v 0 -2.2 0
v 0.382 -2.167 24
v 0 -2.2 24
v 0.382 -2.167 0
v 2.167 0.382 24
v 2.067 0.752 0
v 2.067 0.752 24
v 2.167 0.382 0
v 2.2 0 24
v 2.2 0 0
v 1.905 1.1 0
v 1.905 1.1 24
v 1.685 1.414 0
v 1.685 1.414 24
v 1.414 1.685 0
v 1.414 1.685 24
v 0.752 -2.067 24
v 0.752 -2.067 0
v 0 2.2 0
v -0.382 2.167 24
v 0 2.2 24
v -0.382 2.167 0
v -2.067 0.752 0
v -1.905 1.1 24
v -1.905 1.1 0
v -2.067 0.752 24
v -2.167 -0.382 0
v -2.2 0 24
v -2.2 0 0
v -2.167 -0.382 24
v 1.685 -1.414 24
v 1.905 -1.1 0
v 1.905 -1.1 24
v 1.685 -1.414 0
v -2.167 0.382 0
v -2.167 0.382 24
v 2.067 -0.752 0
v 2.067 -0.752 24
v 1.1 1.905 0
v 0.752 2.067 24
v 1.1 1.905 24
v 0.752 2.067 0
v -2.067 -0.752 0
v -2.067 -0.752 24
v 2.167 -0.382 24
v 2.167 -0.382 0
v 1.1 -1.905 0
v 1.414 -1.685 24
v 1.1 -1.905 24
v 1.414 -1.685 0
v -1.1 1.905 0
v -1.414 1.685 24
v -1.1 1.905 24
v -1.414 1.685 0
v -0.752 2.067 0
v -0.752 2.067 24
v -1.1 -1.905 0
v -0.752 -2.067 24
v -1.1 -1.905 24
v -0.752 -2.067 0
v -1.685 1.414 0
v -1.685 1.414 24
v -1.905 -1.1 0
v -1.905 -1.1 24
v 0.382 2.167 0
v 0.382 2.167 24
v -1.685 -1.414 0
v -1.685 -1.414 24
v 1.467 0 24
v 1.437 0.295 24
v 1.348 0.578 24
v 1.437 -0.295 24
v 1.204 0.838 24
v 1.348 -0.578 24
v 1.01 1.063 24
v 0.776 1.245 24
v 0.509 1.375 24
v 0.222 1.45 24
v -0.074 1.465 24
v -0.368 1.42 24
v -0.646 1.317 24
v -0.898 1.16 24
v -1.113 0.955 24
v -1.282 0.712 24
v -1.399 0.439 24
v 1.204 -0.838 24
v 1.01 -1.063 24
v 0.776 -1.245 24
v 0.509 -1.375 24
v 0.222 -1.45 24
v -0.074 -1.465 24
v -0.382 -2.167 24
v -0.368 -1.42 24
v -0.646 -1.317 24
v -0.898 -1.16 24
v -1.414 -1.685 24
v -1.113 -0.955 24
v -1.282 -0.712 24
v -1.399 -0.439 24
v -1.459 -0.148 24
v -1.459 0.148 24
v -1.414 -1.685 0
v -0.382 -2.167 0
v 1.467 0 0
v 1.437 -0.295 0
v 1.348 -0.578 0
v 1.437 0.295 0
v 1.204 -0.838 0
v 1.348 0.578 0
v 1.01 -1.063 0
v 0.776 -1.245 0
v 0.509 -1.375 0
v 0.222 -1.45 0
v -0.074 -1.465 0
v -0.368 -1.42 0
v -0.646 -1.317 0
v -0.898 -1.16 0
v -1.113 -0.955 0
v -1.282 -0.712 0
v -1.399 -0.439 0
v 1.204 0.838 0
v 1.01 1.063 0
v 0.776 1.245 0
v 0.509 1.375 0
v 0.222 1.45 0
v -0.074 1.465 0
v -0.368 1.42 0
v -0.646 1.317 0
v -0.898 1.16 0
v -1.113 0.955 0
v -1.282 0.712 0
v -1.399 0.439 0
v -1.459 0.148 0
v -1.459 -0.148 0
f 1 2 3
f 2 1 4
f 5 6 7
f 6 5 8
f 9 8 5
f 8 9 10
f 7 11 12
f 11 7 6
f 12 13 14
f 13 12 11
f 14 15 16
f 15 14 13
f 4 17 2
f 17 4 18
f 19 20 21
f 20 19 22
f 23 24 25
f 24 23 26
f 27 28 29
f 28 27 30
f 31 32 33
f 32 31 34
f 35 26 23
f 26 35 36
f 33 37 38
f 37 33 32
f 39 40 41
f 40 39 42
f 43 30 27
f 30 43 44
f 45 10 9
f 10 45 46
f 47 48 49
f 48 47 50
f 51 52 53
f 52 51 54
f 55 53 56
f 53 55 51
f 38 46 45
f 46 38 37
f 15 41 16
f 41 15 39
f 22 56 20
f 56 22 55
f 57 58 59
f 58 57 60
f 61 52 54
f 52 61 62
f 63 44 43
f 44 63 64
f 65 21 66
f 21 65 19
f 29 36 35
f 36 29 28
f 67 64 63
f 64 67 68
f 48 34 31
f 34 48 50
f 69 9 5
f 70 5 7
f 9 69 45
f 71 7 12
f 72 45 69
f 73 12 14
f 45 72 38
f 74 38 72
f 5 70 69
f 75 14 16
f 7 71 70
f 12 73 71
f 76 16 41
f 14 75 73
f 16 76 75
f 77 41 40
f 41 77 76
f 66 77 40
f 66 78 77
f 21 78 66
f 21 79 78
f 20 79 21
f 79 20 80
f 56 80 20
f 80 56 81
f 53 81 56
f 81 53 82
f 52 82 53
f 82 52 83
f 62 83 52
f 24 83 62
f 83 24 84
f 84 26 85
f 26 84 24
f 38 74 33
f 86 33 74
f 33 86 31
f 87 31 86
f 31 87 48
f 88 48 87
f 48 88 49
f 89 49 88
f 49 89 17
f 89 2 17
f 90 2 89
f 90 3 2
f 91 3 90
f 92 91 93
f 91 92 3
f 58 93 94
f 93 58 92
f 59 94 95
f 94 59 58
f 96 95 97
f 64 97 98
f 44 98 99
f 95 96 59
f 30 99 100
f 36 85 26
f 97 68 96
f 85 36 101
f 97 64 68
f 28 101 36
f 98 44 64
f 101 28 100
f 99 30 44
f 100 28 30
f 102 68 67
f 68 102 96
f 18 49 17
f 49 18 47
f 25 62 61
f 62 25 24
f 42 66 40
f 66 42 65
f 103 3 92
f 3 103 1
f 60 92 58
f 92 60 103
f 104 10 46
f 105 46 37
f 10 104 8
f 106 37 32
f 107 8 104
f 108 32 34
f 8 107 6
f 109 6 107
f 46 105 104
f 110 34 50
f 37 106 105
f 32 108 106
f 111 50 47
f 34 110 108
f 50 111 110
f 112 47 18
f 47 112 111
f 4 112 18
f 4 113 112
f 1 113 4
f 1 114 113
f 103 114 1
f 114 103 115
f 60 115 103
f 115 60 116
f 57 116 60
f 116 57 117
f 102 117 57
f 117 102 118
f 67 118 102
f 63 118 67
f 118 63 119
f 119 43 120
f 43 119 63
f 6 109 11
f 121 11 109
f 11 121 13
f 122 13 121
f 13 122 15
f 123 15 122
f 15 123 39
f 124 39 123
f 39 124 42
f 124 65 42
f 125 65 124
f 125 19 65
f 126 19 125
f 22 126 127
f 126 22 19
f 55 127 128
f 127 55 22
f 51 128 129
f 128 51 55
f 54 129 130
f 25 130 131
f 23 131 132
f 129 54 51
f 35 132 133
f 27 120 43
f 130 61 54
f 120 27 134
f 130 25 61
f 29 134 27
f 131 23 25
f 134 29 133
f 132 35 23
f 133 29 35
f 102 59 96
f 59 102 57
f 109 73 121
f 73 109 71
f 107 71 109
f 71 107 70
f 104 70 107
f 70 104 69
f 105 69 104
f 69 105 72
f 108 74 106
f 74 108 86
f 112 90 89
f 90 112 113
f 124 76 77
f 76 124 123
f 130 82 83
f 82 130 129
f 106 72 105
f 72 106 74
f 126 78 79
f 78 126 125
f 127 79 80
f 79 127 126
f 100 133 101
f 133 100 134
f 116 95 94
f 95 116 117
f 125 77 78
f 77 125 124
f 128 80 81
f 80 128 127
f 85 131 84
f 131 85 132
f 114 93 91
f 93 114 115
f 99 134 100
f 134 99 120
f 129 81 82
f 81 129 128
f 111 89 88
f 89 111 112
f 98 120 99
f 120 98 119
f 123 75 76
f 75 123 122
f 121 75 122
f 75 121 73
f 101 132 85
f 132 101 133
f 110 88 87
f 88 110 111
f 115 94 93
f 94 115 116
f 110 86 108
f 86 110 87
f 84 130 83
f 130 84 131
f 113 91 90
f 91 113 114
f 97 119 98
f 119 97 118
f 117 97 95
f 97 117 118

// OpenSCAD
// file: print-parameters.scad
/*
Parametric LEGO Print Tuning Parameters

Published at
    http://www.thingiverse.com/thing:2303714
Maintained at
    https://github.com/paulirotta/parametric_lego
See also the related files
    LEGO Sign Generator - https://www.thingiverse.com/thing:2546028
    LEGO Enclosure Generator - https://www.thingiverse.com/thing:2544197


By Paul Houghton
Twitter: @mobile_rat
Email: paulirotta@gmail.com
Blog: https://medium.com/@paulhoughton

Creative Commons Attribution ShareAlike NonCommercial License
    https://creativecommons.org/licenses/by-sa/4.0/legalcode

Design work kindly sponsored by
    http://futurice.com

Imported automatically into other design files when you include lego_parameters:
    include <lego_parameters.scad>
 

INSTRUCTIONS
============
1. Test print lego_calibration.scad

2. Choose a fit with real LEGO

3. Enter those  numbers here. Most commonly you only adjust the top_tweak, bottom_tweak
   and side_connector_tweak numbers to match for your current use case and
   material/printer/slicer settings. Add comment to this file to help remember what you
   have calibrated now and in the past.

4. Print a couple of 4x4 blocks with these adjusted parameters

5. Confirm your calibration fit with real LEGO and between two printed blocks.

6. All other models in this set will automatically now be adjusted to use your calibration numbers.


SUGGESTIONS
===========
- Don't waste time- use high precision, injection-moulded LEGO parts when they are suitable and available.

- Layer height is not paricularly important, you can use your "standard" setting.

- If needed for a good snap fit, slow down or make similar adjustments to show fine details
  and strong inter-layer adhesion (especially with flexible materials).

- Some printing materials are slippery, not very flexible, or subject to small chips breaking off. This
  can affect the fit and part lifeime. In such cases, look at other parameters such as knob_height and
  geometric flexture adjustments to avoid making your calibration is more tight than needed for your
  application.

- Smaller nozzles give better results. The models are adjusted to work on FFF nozzles up to about 0.6mm
  diameter.
  
- Be patient. You can achieve a great fit and make many things with blocks. 
*/


/* [3D Printing Top Connector Adjustments] */

// Top knob size adjustment (larger is a stiffer fit, add in multiples of 0.01mm as determined from your calibration-block print)
top_tweak = 0;

// Size of the top connectors (note that some plastics are more slippery or brittle than ABS and this may negatively affect results or part lifetime, the value below is tuned for Taz 6 with 0.5 nozzle, Lulzbot Cura default and NGEN)
knob_radius=2.45 + 0.12 + top_tweak;

// Height of the connectors (1.8 is Lego standard, 2 may give a stronger hold while still maintaining compatibility)
knob_height=1.8;

// Size of the small flexture cavity inside each knob (default is 1.4, set to 0 for flexible materials)
knob_flexture_radius=1.4;

// Height of the easy connect slope near connector top (0 to disable such as for flexible materials, a bigger value such as 0.1 may help ease a tightly tuned fit or compensate for overextrusion)
knob_bevel=0.1;


/* [3D Printing Bottom Connector Adjustments] */

// Bottom connector size adjustment (larger is a stiffer fit, add in multiples of 0.01mm as determined from your calibration-block print)
bottom_tweak = 0;

// Bottom connector flexture ring size (note that some plastics are more slippery or brittle than ABS and this may negatively affect results or part lifetime, the value below is tuned for Taz 6 with 0.5 nozzle, Lulzbot Cura default and NGEN)
ring_radius=3.25 - 0.1 + bottom_tweak;

// Base distance which small stiffeners protrude inwards from outside shell edges of a block to hold the knobs of any block below
outside_lock_thickness=1.44 + bottom_tweak;

// Additional distance from outside lock and connector rings which small flexture-fit rims protrude inwards to grab the base of knobs for asymmetric side pressure to assist a snap fit
side_lock_thickness=0.02;


/* [3D Printing Side Connector Adjustments] */

// Side connector size adjustment (larger is a looser fit, add in multiples of 0.01mm as determined from your calibration-block print)
axle_hole_tweak = 0;

// Technic connector hole
axle_hole_radius = 2.45 + 0.02 + axle_hole_tweak;
// file: lego_parameters.scad
/*
Parametric LEGO Block Parameters

Published at
    http://www.thingiverse.com/thing:2303714
Maintained at
    https://github.com/paulirotta/parametric_lego
See also the related files
    LEGO Sign Generator - https://www.thingiverse.com/thing:2546028
    LEGO Enclosure Generator - https://www.thingiverse.com/thing:2544197


By Paul Houghton
Twitter: @mobile_rat
Email: paulirotta@gmail.com
Blog: https://medium.com/@paulhoughton

Creative Commons Attribution ShareAlike NonCommercial License
    https://creativecommons.org/licenses/by-sa/4.0/legalcode

Design work kindly sponsored by
    http://futurice.com

Import this into other design files to set baseline constants:
    include <lego_parameters.scad>
*/

/* [LEGO Basic Options] */

// What type of object to generate: 1=>block, 2=>block without top knobs, 3=>block without bottom connector, 4=>block without top knob or bottom connector
mode=1; // [1:1, 2:2, 3:3, 4:4]

// Length of the block (LEGO knob count)
l = 4; 

// Width of the block (LEGO knob count)
w = 3;

// Height of the block (LEGO brick layer count)
h = 1;

// Place holes in the corners of the panel for mountings screws (0=>no holes, 1=>holes)
bolt_holes=1; // [0:0, 1:1]

// Size of corner holes for mountings screws
bolt_hole_radius=1.5;

/* [3D Printing Adjustments] */

// Top connector size tweak => + = more tight fit, 0.06 for PLA, 0 for ABS, 0.07 for NGEN
top_tweak = 0;

// Bottom connector size tweak => + = more tight fit, -0.03 for PLA, 0 for ABS, -0.01 NGEN
bottom_tweak = 0;

// Height of the easy connect slope near connector top (0 to disable is standard a slightly faster to generate the model, a bigger value such as 0.4 may help if you adjust a tight fit but most printers' slicers will simplify away most usable bevels)
knob_bevel=0;

// Number of flexure cuts across the inside of each knob
knob_slice_count=0;

// Width of flexure cuts across the top of the knob
knob_slice_width=0.15;

// Length of the slice the knob from inside towards the edge
knob_slice_length_ratio=0.7;

/* [LEGO Technics] */

// Add full width through holes spaced along the length for LEGO Techics connectors (0=>no holes, 1=>simple air vents, 2=>single ended Technic connector, 3=>dual ended Technic connector)
side_holes = 1;  // [0:0, 1:1, 2:2, 3:3]

// Add a sheath around side holes (turn off for extra ventilation or rotating shafts)
side_hole_sheaths = 0; // [0:0, 1:1]

// Add short end holes spaced along the width for LEGO Techics connectors (0=>no holes, 1=>simple air vents, 2=>technics connector)
end_holes = 2;  // [0:0, 1:1, 2:2]

// Add a sheath around end holes (turn off for extra ventilation or rotating shafts)
end_hole_sheaths = 1; // [0:0, 1:1]

// Technic connector hole size tweak => + = more loose fit
bearing_hole_tweak = 0;


/* [Heat Ventilation] */

// Add holes in the top deck to improve airflow and reduce weight (0=>no holes, 1=>holes)
top_vents = 1;

// Size of a hole in the top of each knob to keep the cutout as part of the outside surface (slicer-friendly if knob_slice_count=0). Use a larger number for air circulation or to drain resin from the cutout, or 0 to disable.
knob_flexture_airhole_radius=0;

/* [Advanced] */

// Minimum angle to approximate a circle
$fa=6;

// Minimum segment length to approximate a circle
$fs=0.5;

// Clearance space on the outer surface of bricks
skin = 0.1; 

// Width of a line etched in the side of multi-layer block sets (0 to disable)
ridge_width = 0.15;

// Depth of a line etched in the side of multi-layer block sets
ridge_depth = 0.3;

// Distance below knob top surface and the internal cutout
knob_top_thickness=1;

// Size of the connectors
knob_radius=2.4;

// Height of the connectors (1.8 is Lego standard, longer valie like 2.4 gives a stronger hold while still maintaining compatibility)
knob_height=2.4;

// Size of the small flexture cavity inside each connector
knob_flexture_radius=1.5;

// Height of the hole beneath each knob
knob_flexture_height=4.55;

// Number of side to simulate a circle in the air hole and (smaller numbers render faster and are usually sufficient)
airhole_fn=16;

// Width of horizontal surface strengthening slats (usually between the bottom rings)
bottom_stiffener_width=3.8;

// Height of horizontal surface strengthening slats (appears between the bottom rings)
bottom_stiffener_height=4.5;

// Width of horizontal surface strengthening slats (usually between the bottom rings)
side_stiffener_width=0.8;

// Distance from inside walls which small stiffeners protrude inwards
side_stiffener_thickness=0.2;

// Basic unit horizonal size of LEGO
block_width=8;

// Basic unit vertial size of LEGO
block_height=9.6;

// Thickness of the solid outside surface of LEGO
block_shell=1.6; // thickness

// Depth which connectors may press into part bottom
socket_height= 8.6;

// Depth which the inside of connectors are hollowed out
socket_flexture_height= 7.4;

// Bottom connector assistance ring size
ring_radius=3.25;

/* [Advanced LEGO Technic Options] */

// Technic connector hole
bearing_hole_radius = 2.45;

// Technic connector inset radius
bearing_inset_radius = 3.1;

// Technic connector inset depth
bearing_inset_depth = 0.8;

// Technic connector additional depth when cut into a solid surface
bearing_inset_depth_clearance = 1;

// An axle which fits loosely in a technic bearing hole
technic_axle_radius = 2.4;

// How deep into a brick should a hole go before flaring out to grip
technic_bearing_length = 6.2;

// Size of an cylinder wrapped around the entrance to bearing holes
technic_sheath_thickness = 0.6;
// file: lego-parameters.scad
/*
Parametric LEGO Block Parameters

Published at
    http://www.thingiverse.com/thing:2303714
Maintained at
    https://github.com/paulirotta/parametric_lego
See also the related files
    LEGO Sign Generator - https://www.thingiverse.com/thing:2546028
    LEGO Enclosure Generator - https://www.thingiverse.com/thing:2544197


By Paul Houghton
Twitter: @mobile_rat
Email: paulirotta@gmail.com
Blog: https://medium.com/@paulhoughton

Creative Commons Attribution ShareAlike NonCommercial License
    https://creativecommons.org/licenses/by-sa/4.0/legalcode

Design work kindly sponsored by
    http://futurice.com

Import this into other design files to set baseline constants:
    include <lego_parameters.scad>
*/

/* [LEGO-compatible Options] */

// Length of the block (LEGO unit count)
l = 4; 

// Width of the block (LEGO unit count)
w = 4;

// Height of the block (LEGO unit count)
h = 1;


/* [Basic Block Features] */

// Presence of bottom connector sockets
sockets= 1; // [0:no sockets, 1:sockets]

// Presence of top connector knobs
knobs=1; // [0:disabled, 1:enabled]

// Place holes in the corners for mountings screws (0=>no holes, 1=>holes)
bolt_holes=0; // [0:no holes, 1:holes]

// Size of corner holes for M3 mountings bolts
bolt_hole_radius=1.5;

// Interior fill for layers above the bottom
solid_upper_layers = 0; // [0:empty, 1:solid]

// Interior fill for layers above the bottom
solid_bottom_layer = 0; // [0:empty, 1:solid]


/* [Technic-compatible Block Features] */

// Add full width through holes spaced along the length for LEGO Techics connectors
side_holes = 0;  // [0:disabled, 1:short air vents, 2:short connectors, 3:full width connectors]

// Add a sheath around Technic side holes (disable for extra ventilation, enable for connector lock notches)
side_sheaths = 1; // [0:disabled, 1:enabled]

// Add short end holes spaced along the width for LEGO Techics connectors
end_holes = 2;  // [0:disabled, 1:short air vents, 2:short connectors, 3:full length connectors]

// Add a sheath around end holes  (disable for extra ventilation, enable for connector lock notches)
end_sheaths = 1; // [0:disabled, 1:enabled]

// Add holes in the top deck to improve airflow and reduce weight
top_vents = 1; // [0:disabled, 1:enabled]

// Size of a hole in the top of each knob to keep the cutout as part of the outside surface (slicer-friendly manifold shape). 0 to disable or use for air circulation/aesthetics/drain resin from the cutout, but larger holes change flexture such that knobs may not hold as well.
knob_vent_radius = 0;

// Add bars on the bottom surface between rings (recommended, holds the rings in position during printing, material flex and if upper structures are cut away)
ring_bars = 1;// [0:disabled, 1:bars between bottom rings]


/* [Aesthetic Options for Basic Blocks] */

// Width of a line etched in the side of multi-layer block sets (0 to disable)
ridge_width = 0.15;

// Depth of a line etched in the side of multi-layer block sets
ridge_depth = 0.3;



include <print-parameters.scad>

function dummy(x)=x; // This first function will block all uncommon parameters below from appearing in the online customizer


/* [Advanced Options for Basic Blocks] */

// Minimum angle to approximate a circle
$fa=10;

// Minimum segment length to approximate a circle
$fs=0.3;

// Basic unit horizontal size of LEGO
block_width=8;

// Basic unit vertical size of LEGO
block_height=9.6;

// Thickness of the solid outside surface of LEGO
shell=1.2;

// Thickness of the solid top surface of LEGO
top_shell=1.2;

// Clearance space around the outer surface of bricks
skin = 0.1; 

// Distance below knob top surface and the internal cutout
knob_top_thickness=0.8;

// Height of the hole beneath each knob
knob_flexture_height=4.5;

// Width of horizontal surface strengthening slats between the bottom rings
bottom_stiffener_width=2.7;

// Height of horizontal surface strengthening slats (appears between the bottom rings)
bottom_stiffener_height=block_height/4;


/* [Advanced Options for Technic-compatible Blocks] */

// Technic connector inset radius
counterbore_inset_radius = 3.1;

// Technic connector inset depth
counterbore_inset_depth = 0.8;

// Contact length of axle to brick (not including inset length and end snap fit flexture in pin connectors)
peg_length = 6.5;

// Size of an optional cylinder wrapped around the bearing holes
bearing_sheath_thickness = 0.9;
// main file
/*
Parametric LEGO Technic-compatible Axle

Published at
    http://www.thingiverse.com/thing:XXXX
Maintained at
    https://github.com/paulirotta/parametric_lego
See also the related files
    LEGO Sign Generator - https://www.thingiverse.com/thing:2546028
    LEGO Enclosure Generator - https://www.thingiverse.com/thing:2544197


By Paul Houghton
Twitter: @mobile_rat
Email: paulirotta@gmail.com
Blog: https://medium.com/@paulhoughton

Creative Commons Attribution ShareAlike NonCommercial License
    https://creativecommons.org/licenses/by-sa/4.0/legalcode

Design work kindly sponsored by
    http://futurice.com
*/

include <lego-parameters.scad>
use <lego.scad>

/* [LEGO Technic-compatible Pin Options] */

// Axle length
axle_length = lego_width(3);

// An axle which fits loosely in a technic bearing hole
axle_radius = 2.2;

// Size of the hollow inside an axle
axle_center_radius=2*axle_radius/3;

defeather=0.01;

///////////////

axle();

    
//////////////////


// A round rotation axle
module axle(axle_radius=axle_radius, axle_center_radius=axle_center_radius, axle_length=axle_length) {

    difference() {
        cylinder(r=axle_radius, h=axle_length);
        translate([0, 0, -defeather])
            cylinder(r=axle_center_radius, h=axle_length+2*defeather);
    }
}
